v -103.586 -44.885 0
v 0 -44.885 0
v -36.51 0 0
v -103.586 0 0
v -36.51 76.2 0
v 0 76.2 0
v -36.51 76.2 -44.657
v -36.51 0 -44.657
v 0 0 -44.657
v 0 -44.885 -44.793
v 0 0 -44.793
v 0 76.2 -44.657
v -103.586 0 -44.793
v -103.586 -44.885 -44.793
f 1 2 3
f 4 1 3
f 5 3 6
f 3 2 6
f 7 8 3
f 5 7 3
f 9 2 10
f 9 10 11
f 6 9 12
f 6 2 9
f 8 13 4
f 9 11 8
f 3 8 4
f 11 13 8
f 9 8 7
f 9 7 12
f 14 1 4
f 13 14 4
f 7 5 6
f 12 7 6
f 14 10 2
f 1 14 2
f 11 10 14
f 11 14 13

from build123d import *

# Parameters (mm, degrees)
F0_W     = 36.510132
F0_H     = 44.657022
F1_DEPTH = 76.2
F2_W     = 44.885072
F2_H     = 44.793312
F3_DEPTH = 103.585832


with BuildPart() as f1:
    # F0 (on Front) → F1 (new body)
    with BuildSketch(Plane.XZ):
        with Locations((-18.255066, -22.328511)):
            Rectangle(F0_W, F0_H)
    extrude(amount=-F1_DEPTH)

    # F2 (on Right) → F3 (join)
    with BuildSketch(Plane.YZ):
        with Locations((-22.442536, -22.396656)):
            Rectangle(F2_W, F2_H)
    extrude(amount=-F3_DEPTH)


solid = f1.part
